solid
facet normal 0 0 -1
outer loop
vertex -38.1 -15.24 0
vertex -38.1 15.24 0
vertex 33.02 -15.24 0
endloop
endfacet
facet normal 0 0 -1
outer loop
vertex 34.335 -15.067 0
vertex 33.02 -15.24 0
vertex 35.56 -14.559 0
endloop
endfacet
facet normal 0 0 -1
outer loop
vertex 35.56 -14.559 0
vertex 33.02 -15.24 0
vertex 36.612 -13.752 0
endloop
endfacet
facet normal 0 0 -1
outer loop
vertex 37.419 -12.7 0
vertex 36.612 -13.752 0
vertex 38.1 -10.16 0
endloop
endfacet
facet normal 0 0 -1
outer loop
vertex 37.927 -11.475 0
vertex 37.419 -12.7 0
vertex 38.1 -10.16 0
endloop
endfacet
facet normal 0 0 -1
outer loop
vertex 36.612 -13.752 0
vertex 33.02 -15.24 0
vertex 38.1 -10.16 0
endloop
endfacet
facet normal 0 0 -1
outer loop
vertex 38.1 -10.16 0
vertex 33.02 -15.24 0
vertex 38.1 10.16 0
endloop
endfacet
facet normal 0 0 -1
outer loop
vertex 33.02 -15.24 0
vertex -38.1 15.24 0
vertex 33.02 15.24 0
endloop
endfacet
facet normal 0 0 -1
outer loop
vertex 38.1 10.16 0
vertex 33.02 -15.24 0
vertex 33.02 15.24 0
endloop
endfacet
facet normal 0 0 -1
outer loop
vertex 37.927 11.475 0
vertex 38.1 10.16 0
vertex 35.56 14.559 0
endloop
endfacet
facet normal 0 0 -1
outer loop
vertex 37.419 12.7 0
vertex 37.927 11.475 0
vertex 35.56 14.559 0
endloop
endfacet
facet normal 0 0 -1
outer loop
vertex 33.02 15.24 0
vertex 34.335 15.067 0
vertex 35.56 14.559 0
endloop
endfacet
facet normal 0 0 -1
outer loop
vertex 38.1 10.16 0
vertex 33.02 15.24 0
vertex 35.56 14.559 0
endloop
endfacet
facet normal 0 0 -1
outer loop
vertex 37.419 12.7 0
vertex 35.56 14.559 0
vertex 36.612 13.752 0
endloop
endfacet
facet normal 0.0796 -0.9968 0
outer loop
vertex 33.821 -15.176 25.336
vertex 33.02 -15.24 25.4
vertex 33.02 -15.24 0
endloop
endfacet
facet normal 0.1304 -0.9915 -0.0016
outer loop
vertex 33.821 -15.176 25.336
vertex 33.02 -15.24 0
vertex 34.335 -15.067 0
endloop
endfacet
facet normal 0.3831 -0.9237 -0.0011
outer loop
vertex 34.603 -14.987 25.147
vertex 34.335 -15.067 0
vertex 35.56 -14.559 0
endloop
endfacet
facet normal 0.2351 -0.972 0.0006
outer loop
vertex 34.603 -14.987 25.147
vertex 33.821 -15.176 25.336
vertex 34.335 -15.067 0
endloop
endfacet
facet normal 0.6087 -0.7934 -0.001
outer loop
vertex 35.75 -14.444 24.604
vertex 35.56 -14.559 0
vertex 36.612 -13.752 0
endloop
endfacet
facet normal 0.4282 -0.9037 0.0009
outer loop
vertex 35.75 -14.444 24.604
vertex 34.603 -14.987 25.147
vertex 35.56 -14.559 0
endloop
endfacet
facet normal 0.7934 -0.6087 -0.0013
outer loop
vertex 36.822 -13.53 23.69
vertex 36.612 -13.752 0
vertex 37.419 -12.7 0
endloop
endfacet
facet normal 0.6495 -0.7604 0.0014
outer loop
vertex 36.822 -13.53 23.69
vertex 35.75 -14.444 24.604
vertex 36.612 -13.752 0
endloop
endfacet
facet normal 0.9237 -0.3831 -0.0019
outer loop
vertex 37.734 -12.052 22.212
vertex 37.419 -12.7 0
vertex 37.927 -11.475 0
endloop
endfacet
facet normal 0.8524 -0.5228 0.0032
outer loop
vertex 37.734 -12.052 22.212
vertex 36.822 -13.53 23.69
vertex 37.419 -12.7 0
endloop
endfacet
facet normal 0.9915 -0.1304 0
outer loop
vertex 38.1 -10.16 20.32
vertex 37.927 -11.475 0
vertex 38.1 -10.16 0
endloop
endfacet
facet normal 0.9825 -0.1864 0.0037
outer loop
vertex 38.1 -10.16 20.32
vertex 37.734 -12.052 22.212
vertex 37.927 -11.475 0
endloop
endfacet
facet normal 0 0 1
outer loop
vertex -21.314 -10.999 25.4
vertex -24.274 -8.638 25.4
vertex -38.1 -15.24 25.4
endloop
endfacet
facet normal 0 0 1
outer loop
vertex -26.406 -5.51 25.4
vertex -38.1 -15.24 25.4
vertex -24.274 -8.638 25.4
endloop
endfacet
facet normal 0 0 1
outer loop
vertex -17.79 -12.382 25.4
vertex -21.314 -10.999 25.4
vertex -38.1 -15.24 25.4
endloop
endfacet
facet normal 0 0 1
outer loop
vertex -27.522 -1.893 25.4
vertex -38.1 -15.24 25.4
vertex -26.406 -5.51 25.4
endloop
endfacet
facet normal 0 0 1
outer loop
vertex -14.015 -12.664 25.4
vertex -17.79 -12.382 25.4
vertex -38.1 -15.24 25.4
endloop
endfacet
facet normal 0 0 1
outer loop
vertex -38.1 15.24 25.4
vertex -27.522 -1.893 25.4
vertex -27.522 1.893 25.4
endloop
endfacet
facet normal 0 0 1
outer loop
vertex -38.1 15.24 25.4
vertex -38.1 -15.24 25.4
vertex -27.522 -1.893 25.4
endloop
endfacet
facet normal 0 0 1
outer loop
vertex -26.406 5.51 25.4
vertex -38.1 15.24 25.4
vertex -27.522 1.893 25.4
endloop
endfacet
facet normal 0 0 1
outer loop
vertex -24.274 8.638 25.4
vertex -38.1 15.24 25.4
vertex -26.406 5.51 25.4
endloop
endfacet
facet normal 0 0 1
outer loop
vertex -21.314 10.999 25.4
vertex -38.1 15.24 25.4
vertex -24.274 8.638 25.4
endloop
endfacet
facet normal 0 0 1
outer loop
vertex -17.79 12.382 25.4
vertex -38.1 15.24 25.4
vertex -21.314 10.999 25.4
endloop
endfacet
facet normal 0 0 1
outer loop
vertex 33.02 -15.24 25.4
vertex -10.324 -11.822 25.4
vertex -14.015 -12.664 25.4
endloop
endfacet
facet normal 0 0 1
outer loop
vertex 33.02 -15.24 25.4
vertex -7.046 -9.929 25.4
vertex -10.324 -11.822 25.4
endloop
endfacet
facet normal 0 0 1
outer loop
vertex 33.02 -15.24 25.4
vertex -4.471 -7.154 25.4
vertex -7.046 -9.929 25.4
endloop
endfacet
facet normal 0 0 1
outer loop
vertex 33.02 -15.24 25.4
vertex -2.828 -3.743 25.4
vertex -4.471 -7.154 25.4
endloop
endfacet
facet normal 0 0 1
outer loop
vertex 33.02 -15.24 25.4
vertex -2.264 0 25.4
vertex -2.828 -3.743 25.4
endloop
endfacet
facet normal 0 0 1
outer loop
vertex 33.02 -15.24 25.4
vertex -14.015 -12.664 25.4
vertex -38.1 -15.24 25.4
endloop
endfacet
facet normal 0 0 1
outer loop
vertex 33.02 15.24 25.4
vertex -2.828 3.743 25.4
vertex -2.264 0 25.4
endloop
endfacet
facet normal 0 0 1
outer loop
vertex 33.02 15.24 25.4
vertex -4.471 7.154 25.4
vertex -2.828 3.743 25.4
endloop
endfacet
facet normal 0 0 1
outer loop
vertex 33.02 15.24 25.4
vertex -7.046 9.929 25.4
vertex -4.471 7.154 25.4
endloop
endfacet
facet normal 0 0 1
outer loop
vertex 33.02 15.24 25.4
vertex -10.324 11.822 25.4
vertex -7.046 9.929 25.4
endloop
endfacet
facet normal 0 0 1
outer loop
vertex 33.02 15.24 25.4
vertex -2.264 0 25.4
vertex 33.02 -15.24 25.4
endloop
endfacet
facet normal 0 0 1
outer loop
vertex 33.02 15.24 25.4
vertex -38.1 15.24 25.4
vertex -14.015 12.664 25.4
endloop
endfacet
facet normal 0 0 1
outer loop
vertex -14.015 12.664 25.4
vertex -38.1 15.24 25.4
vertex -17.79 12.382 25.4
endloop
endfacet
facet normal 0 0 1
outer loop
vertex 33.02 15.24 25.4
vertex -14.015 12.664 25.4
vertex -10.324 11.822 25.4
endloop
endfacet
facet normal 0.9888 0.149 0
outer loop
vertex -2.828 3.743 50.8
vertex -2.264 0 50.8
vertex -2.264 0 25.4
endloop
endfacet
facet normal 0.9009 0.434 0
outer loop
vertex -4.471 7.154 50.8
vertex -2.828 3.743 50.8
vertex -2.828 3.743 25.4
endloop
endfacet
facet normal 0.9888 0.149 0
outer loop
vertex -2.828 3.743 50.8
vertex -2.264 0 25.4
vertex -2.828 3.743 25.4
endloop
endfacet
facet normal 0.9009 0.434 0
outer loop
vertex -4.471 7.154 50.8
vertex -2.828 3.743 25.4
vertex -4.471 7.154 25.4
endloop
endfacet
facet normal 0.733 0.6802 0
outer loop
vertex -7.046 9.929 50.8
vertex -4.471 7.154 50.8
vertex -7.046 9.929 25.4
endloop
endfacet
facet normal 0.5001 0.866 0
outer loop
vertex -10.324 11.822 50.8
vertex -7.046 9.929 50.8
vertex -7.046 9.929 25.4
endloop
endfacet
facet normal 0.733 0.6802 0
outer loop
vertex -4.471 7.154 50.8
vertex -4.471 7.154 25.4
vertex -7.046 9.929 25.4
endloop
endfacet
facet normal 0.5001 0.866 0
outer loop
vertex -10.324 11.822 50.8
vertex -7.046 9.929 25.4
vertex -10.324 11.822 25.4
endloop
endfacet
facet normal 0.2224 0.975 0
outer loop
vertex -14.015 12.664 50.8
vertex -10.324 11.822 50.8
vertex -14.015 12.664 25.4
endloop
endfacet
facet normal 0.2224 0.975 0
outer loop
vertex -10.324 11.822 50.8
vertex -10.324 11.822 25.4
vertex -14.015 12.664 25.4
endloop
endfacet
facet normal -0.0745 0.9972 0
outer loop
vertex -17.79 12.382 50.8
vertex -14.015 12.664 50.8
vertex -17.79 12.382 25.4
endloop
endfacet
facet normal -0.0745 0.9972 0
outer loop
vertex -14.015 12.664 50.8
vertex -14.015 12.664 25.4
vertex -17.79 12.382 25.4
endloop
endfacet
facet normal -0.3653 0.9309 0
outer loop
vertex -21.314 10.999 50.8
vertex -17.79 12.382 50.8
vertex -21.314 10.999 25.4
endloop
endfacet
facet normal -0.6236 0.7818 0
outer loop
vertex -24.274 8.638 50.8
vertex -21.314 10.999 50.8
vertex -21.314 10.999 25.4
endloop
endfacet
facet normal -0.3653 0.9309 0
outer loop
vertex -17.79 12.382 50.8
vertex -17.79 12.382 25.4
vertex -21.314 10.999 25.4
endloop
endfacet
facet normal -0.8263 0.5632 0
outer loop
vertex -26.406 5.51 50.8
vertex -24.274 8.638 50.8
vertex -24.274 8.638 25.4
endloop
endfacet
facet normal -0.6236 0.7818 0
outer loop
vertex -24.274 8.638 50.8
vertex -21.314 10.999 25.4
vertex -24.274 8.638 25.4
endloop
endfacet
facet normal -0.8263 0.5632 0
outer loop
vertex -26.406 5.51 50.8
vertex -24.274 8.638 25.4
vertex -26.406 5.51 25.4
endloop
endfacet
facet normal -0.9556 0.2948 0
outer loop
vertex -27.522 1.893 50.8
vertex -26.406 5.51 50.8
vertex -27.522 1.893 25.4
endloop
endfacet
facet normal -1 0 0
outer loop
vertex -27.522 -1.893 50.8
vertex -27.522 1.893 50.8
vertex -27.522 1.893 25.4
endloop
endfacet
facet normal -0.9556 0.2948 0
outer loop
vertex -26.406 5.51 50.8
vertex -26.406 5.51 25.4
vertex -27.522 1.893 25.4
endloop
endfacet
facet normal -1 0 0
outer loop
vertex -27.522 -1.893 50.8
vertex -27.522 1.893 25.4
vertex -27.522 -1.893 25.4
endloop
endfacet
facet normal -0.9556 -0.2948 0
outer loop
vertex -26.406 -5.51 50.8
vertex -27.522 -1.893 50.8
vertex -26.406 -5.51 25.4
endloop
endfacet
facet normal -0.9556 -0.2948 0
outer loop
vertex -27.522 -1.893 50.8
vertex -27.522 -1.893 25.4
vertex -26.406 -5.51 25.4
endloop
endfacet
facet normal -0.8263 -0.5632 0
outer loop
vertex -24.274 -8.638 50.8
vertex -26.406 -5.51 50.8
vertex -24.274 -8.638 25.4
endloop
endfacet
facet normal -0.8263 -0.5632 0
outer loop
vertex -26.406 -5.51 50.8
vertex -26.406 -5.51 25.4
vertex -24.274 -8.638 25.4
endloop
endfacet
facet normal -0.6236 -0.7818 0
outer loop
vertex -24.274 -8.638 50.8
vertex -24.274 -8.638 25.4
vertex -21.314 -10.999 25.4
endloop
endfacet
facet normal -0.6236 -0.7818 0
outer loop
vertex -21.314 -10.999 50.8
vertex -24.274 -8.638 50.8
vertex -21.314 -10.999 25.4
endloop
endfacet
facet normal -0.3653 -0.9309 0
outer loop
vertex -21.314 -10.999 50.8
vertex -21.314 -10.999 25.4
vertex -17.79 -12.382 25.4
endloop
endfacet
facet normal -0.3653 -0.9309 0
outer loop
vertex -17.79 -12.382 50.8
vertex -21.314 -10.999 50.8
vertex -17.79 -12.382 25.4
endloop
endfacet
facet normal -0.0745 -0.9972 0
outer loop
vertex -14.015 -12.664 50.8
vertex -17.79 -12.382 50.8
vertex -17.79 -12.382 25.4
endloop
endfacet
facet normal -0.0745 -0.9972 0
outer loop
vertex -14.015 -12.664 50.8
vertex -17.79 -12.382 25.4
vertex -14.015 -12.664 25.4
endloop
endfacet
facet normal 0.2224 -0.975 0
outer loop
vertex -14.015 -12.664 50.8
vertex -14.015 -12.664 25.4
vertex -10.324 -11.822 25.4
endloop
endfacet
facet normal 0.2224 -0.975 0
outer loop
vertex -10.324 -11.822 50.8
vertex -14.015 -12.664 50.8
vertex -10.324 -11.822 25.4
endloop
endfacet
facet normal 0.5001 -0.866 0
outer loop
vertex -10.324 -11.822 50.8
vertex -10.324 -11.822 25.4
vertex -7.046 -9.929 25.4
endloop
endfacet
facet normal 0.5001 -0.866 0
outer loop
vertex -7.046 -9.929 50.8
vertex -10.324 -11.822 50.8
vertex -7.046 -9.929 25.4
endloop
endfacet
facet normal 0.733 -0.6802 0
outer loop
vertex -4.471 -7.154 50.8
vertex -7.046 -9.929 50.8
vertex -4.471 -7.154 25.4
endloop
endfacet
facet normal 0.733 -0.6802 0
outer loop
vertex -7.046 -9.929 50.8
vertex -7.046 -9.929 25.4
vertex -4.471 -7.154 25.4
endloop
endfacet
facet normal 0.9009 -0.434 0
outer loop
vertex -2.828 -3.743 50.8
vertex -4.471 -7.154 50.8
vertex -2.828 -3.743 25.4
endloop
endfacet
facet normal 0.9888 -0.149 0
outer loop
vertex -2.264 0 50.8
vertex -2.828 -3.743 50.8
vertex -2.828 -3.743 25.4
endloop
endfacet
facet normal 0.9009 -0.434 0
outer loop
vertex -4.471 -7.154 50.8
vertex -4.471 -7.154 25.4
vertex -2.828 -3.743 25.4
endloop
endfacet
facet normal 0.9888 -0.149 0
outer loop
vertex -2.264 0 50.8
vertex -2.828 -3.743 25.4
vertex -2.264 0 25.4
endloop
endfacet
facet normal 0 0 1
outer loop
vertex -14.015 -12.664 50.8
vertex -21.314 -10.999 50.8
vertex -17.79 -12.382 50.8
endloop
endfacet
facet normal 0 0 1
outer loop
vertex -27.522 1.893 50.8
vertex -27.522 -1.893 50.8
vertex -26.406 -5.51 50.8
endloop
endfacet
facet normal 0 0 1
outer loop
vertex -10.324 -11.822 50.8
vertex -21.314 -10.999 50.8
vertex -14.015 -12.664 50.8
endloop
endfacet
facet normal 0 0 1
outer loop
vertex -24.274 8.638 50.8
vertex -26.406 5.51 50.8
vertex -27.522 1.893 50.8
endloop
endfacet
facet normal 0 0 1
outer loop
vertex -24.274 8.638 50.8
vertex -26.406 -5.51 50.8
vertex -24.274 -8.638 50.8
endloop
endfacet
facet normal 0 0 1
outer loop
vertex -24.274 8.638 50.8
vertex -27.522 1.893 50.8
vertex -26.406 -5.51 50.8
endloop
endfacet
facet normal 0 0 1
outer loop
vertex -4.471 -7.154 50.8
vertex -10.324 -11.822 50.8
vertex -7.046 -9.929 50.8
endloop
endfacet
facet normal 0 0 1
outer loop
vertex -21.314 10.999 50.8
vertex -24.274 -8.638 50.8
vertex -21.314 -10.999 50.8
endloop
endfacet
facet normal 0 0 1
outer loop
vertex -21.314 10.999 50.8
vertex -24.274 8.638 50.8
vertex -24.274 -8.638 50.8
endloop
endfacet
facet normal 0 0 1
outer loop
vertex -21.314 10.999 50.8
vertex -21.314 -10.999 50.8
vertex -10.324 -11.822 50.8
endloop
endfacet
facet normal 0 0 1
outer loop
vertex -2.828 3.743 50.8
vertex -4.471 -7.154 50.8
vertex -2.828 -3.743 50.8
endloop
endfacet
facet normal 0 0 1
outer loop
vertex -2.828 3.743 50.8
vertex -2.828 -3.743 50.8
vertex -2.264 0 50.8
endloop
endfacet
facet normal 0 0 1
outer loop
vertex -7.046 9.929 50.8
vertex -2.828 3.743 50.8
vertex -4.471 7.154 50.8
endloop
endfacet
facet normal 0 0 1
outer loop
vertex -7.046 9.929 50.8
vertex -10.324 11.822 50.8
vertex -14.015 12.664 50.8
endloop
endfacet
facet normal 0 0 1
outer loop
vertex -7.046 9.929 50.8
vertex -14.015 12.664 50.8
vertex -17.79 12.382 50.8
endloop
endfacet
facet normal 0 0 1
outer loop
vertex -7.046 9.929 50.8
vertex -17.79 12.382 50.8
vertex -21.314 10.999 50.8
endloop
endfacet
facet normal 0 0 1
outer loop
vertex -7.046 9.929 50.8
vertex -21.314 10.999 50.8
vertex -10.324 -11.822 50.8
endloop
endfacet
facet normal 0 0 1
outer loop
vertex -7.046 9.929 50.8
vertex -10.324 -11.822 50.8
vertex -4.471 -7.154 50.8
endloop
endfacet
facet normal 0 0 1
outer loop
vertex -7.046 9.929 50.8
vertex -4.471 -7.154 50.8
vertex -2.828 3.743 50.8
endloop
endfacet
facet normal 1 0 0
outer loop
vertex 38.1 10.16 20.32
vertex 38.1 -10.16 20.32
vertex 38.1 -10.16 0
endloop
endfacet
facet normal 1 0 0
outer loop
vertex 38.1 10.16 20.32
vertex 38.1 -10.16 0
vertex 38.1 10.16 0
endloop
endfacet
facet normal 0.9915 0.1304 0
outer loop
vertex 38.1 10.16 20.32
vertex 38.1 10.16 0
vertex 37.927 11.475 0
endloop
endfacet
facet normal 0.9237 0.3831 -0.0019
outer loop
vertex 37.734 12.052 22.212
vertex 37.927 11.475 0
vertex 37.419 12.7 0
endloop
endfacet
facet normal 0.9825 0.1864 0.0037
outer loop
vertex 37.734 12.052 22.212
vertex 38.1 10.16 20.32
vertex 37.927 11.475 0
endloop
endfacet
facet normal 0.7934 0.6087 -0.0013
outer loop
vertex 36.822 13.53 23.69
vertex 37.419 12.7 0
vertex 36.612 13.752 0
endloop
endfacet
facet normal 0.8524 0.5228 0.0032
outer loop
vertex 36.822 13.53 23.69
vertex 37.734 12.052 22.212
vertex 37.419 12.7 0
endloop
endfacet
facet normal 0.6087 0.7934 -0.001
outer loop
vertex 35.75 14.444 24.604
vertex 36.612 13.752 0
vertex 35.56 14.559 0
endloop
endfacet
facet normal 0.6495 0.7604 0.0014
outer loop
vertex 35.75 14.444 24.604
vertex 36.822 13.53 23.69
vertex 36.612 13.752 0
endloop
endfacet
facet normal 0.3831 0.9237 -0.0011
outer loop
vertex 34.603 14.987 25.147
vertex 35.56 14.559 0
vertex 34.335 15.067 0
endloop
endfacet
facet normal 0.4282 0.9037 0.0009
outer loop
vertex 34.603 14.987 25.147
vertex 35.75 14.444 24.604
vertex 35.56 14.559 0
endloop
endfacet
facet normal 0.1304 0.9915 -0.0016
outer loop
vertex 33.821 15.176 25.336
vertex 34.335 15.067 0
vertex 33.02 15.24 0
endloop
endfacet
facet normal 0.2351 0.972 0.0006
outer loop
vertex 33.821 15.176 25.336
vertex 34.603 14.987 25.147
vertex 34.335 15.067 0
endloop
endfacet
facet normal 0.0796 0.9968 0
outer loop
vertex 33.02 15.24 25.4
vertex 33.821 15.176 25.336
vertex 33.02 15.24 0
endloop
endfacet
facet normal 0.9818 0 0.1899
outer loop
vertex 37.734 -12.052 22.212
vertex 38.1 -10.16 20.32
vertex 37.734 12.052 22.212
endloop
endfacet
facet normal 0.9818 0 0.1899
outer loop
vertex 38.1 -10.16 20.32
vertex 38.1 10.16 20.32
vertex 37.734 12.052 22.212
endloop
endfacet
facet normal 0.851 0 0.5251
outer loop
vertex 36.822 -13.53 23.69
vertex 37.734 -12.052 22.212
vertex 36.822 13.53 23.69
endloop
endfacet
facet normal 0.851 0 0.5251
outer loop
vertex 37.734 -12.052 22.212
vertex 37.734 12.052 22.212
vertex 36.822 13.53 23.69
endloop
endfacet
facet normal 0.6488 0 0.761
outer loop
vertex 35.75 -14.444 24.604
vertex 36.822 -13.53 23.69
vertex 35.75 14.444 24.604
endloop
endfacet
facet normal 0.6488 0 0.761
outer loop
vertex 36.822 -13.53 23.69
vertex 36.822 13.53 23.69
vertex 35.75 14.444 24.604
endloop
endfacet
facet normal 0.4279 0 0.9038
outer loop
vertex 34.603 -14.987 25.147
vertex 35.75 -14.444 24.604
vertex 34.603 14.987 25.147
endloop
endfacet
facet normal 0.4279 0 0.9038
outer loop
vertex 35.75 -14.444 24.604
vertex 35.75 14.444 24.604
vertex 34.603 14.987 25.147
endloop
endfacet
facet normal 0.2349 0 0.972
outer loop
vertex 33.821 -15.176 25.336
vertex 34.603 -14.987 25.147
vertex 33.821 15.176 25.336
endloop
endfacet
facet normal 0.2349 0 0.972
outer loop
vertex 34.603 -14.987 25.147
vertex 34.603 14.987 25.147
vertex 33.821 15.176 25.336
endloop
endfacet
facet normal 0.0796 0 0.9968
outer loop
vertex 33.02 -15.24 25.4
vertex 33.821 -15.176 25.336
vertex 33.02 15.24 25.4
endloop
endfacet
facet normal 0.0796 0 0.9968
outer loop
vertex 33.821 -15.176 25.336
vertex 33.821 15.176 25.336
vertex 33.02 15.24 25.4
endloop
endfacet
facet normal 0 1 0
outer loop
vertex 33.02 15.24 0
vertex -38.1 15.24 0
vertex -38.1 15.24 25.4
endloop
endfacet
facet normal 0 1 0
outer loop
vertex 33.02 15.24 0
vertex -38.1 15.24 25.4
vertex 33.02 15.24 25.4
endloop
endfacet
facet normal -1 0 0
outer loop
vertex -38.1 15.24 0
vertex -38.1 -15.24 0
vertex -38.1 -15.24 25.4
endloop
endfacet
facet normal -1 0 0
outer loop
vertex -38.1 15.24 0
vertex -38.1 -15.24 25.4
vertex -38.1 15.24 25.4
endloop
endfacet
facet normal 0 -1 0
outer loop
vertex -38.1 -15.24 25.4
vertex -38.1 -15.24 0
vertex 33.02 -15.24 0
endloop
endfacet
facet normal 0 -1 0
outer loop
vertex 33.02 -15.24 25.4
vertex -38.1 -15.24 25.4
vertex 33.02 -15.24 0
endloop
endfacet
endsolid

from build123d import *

# Parameters (mm, degrees)
F0_W     = 76.2
F0_H     = 30.48
F1_DEPTH = 25.4
F2_R     = 5.08
F4_R     = 12.7
F5_DEPTH = 25.4


with BuildPart() as f1:
    # F0 (on Top) → F1 (new body)
    with BuildSketch(Plane.XY):
        Rectangle(F0_W, F0_H)
    extrude(amount=F1_DEPTH)

    # F2
    f2_edges = [f1.edges().sort_by_distance(p)[0] for p in [
        (38.1, 0, 25.4),
        (38.1, -15.24, 12.7),
        (38.1, 15.24, 12.7),
    ]]
    fillet(f2_edges, radius=F2_R)

    # F4 (on face) → F5 (join)
    with BuildSketch(Plane.XY.offset(25.4)):
        with Locations((-14.963861, 0)):
            Circle(F4_R)
    extrude(amount=F5_DEPTH)


solid = f1.part
